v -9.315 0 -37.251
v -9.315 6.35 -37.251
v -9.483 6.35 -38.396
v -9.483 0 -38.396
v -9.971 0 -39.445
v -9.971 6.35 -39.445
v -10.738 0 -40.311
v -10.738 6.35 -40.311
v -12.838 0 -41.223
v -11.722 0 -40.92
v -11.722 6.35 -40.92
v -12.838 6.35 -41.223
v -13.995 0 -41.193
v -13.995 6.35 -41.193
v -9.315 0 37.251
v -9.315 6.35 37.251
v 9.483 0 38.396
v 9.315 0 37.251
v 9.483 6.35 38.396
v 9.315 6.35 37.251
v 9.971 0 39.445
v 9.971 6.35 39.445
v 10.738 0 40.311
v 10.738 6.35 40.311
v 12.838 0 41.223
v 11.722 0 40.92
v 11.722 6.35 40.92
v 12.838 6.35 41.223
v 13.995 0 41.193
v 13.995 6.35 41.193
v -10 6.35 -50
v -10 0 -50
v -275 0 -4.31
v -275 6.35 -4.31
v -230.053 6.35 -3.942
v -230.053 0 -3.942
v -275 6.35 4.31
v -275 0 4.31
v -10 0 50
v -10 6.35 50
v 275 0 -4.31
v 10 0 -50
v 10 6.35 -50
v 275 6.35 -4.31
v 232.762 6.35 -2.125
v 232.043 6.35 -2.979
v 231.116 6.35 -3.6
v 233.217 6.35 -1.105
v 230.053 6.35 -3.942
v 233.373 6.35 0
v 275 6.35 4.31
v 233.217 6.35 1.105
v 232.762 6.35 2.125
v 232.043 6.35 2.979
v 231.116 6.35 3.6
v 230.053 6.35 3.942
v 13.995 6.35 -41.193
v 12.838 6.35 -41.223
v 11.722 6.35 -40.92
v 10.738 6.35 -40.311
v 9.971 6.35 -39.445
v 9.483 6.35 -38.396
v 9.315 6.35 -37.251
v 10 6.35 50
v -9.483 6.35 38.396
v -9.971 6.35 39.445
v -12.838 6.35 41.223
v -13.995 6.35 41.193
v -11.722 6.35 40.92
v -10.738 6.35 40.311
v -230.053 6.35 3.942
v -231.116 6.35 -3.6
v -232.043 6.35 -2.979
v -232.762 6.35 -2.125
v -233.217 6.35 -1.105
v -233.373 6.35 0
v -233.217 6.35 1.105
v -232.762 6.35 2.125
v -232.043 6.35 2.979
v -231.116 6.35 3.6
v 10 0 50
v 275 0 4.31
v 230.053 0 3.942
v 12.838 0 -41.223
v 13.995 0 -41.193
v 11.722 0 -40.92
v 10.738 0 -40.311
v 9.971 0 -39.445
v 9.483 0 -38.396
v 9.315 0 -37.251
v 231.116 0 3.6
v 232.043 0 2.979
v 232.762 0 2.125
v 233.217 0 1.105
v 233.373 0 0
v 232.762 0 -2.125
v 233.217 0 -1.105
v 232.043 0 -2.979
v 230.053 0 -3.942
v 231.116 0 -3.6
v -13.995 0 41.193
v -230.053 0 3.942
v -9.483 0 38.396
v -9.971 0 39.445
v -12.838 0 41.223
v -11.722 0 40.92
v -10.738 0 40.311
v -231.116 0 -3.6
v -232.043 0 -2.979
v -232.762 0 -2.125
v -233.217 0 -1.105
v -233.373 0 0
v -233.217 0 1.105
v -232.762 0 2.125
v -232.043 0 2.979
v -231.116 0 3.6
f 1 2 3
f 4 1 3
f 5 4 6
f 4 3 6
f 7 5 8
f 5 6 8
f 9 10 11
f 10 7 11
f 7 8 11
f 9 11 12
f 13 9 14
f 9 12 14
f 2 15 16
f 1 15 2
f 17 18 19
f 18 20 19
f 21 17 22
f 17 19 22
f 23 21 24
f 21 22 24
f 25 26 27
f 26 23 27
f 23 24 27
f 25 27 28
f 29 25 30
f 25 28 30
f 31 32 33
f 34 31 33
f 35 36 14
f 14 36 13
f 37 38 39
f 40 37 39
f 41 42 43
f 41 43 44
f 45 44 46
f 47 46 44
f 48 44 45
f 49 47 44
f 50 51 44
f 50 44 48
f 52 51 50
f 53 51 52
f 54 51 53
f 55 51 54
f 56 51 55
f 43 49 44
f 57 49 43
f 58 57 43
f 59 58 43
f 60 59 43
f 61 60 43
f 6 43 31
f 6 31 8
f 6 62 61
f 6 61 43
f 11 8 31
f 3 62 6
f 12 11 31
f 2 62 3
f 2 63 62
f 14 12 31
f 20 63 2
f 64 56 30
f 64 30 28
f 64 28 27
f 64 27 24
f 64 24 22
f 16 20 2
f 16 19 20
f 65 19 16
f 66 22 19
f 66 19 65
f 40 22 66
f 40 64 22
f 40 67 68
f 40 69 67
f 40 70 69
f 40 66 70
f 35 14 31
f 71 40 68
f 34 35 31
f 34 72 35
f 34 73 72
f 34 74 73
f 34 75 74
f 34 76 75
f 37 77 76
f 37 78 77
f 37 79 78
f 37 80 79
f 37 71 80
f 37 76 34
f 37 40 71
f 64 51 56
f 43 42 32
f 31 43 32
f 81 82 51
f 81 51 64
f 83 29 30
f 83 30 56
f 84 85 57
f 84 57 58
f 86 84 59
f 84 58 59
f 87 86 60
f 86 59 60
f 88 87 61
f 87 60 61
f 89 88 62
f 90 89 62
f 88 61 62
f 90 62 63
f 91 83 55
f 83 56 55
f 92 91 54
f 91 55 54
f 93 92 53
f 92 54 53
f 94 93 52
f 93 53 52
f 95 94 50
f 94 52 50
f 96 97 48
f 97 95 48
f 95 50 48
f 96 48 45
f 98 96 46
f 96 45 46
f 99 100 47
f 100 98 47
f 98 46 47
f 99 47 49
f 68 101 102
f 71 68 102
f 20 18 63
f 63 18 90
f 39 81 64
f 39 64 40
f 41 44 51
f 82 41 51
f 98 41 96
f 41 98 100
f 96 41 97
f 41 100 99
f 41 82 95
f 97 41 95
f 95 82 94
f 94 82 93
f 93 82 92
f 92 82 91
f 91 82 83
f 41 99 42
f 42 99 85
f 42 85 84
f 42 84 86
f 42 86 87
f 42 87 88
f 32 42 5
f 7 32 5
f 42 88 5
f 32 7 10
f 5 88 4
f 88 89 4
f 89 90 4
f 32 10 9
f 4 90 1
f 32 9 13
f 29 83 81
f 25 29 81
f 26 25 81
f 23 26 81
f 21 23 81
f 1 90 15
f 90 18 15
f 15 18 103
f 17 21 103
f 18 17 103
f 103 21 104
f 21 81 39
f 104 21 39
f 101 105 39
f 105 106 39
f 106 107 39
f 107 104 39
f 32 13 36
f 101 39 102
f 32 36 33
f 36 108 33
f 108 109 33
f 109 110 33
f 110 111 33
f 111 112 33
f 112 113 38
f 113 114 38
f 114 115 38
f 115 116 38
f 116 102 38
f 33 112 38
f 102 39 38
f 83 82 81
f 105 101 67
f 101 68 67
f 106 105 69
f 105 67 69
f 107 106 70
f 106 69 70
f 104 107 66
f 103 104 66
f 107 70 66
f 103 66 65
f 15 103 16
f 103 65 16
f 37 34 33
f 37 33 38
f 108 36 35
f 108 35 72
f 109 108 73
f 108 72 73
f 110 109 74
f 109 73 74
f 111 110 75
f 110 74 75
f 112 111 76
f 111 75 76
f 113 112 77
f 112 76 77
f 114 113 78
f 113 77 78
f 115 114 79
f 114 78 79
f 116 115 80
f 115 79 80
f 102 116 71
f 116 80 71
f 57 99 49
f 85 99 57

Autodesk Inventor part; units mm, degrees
ref_plane "YZ Plane" through (0, 0, 0) normal (1, 0, 0) x (0, 1, 0)
ref_plane "XZ Plane" through (0, 0, 0) normal (0, 1, 0) x (-1, 0, 0)
ref_plane "XY Plane" through (0, 0, 0) normal (0, 0, 1) x (1, 0, 0)
sketch "Sketch1" plane through (0, 0, 0) normal (0, 1, 0) x (-1, 0, 0)
  line L0 (420, 0) -> (-420, 0) projected
  line L1 (0, 50) -> (-10, 50)
  line L2 (0, -50) -> (-10, -50)
  line L3 (-10, -50) -> (-300, 0)
  line L4 (-300, 0) -> (-10, 50)
  line L5 (0, 50) -> (0, -50)
  line L6 (0, 50) -> (10, 50)
  line L7 (0, -50) -> (10, -50)
  line L8 (10, -50) -> (300, 0)
  line L9 (300, 0) -> (10, 50)
  line L10 (-300, 0) -> (300, 0)
  line L11 (0, -70) -> (0, 70) projected
  line L12 (-300, 0) -> (-300, 0)
  line L13 (300, 0) -> (300, 0)
  line L14 (0, 42) -> (9.3154, 42)
  line L15 (9.3154, 42) -> (252.9154, 0)
  line L16 (252.9154, 0) -> (9.3154, -42)
  line L17 (9.3154, -42) -> (0, -42)
  line L18 (0, 42) -> (-9.3154, 42)
  line L19 (-9.3154, 42) -> (-252.9154, 0)
  line L20 (-252.9154, 0) -> (-9.3154, -42)
  line L21 (-9.3154, -42) -> (0, -42)
  line L22 (9.3154, 42) -> (9.3154, -42)
  line L23 (-9.3154, 42) -> (-9.3154, -42)
  point P0 (0, 0)
  point P1 (300, 0)
  point P2 (-300, 0)
  dimension "d36" = 600
  dimension "d38" = 10
  dimension "d39" = 100
  dimension "d44" = 8
  dimension "d45" = 8
  dimension "d47" = 600
  dimension "d49" = 300
  dimension "d51" = 0
  dimension "d52" = 300
  dimension "d53" = 300
  dimension "d54" = 0
  dimension "d55" = 0
  dimension "d56" = 0
  dimension "d57" = 0
  dimension "d60" = 0
extrude "Main_block" add sketch "Sketch1" along normal blind 6.35 contours L8 L7 L5 L17 L16 L0 | L0 L15 L14 L5 L6 L9 | L22 L17 L5 L0 | L0 L5 L14 L22 | L2 L3 L0 L20 L21 L5 | L5 L18 L19 L0 L4 L1 | L5 L21 L23 L0 | L0 L23 L18 L5
fillet "Fillet7" radius 4 6 edges at (-9.3154, 3.175, -42) (9.3154, 3.175, -42) (9.3154, 3.175, 42) (-9.3154, 3.175, 42) (252.9154, 3.175, 0) (-252.9154, 3.175, 0)
sketch "Sketch4" plane through (0, 6.35, 0) normal (0, 1, 0) x (1, 0, 0)
  line L0 (-300, 0) -> (-10, -50) projected
  line L1 (-10, 50) -> (-300, 0) projected
  line L2 (-275, 4.3103) -> (-275, -4.3103)
  line L3 (-275, -4.3103) -> (-300, 0)
  line L4 (-300, 0) -> (-275, 4.3103)
  line L5 (0, 70) -> (0, -70) projected
  line L6 (275, 4.3103) -> (275, -4.3103)
  line L7 (275, -4.3103) -> (300, 0)
  line L8 (300, 0) -> (275, 4.3103)
  point P0 (0, 0)
extrude "Extrusion4" cut sketch "Sketch4" against normal blind 10
properties part number "Main Support"
